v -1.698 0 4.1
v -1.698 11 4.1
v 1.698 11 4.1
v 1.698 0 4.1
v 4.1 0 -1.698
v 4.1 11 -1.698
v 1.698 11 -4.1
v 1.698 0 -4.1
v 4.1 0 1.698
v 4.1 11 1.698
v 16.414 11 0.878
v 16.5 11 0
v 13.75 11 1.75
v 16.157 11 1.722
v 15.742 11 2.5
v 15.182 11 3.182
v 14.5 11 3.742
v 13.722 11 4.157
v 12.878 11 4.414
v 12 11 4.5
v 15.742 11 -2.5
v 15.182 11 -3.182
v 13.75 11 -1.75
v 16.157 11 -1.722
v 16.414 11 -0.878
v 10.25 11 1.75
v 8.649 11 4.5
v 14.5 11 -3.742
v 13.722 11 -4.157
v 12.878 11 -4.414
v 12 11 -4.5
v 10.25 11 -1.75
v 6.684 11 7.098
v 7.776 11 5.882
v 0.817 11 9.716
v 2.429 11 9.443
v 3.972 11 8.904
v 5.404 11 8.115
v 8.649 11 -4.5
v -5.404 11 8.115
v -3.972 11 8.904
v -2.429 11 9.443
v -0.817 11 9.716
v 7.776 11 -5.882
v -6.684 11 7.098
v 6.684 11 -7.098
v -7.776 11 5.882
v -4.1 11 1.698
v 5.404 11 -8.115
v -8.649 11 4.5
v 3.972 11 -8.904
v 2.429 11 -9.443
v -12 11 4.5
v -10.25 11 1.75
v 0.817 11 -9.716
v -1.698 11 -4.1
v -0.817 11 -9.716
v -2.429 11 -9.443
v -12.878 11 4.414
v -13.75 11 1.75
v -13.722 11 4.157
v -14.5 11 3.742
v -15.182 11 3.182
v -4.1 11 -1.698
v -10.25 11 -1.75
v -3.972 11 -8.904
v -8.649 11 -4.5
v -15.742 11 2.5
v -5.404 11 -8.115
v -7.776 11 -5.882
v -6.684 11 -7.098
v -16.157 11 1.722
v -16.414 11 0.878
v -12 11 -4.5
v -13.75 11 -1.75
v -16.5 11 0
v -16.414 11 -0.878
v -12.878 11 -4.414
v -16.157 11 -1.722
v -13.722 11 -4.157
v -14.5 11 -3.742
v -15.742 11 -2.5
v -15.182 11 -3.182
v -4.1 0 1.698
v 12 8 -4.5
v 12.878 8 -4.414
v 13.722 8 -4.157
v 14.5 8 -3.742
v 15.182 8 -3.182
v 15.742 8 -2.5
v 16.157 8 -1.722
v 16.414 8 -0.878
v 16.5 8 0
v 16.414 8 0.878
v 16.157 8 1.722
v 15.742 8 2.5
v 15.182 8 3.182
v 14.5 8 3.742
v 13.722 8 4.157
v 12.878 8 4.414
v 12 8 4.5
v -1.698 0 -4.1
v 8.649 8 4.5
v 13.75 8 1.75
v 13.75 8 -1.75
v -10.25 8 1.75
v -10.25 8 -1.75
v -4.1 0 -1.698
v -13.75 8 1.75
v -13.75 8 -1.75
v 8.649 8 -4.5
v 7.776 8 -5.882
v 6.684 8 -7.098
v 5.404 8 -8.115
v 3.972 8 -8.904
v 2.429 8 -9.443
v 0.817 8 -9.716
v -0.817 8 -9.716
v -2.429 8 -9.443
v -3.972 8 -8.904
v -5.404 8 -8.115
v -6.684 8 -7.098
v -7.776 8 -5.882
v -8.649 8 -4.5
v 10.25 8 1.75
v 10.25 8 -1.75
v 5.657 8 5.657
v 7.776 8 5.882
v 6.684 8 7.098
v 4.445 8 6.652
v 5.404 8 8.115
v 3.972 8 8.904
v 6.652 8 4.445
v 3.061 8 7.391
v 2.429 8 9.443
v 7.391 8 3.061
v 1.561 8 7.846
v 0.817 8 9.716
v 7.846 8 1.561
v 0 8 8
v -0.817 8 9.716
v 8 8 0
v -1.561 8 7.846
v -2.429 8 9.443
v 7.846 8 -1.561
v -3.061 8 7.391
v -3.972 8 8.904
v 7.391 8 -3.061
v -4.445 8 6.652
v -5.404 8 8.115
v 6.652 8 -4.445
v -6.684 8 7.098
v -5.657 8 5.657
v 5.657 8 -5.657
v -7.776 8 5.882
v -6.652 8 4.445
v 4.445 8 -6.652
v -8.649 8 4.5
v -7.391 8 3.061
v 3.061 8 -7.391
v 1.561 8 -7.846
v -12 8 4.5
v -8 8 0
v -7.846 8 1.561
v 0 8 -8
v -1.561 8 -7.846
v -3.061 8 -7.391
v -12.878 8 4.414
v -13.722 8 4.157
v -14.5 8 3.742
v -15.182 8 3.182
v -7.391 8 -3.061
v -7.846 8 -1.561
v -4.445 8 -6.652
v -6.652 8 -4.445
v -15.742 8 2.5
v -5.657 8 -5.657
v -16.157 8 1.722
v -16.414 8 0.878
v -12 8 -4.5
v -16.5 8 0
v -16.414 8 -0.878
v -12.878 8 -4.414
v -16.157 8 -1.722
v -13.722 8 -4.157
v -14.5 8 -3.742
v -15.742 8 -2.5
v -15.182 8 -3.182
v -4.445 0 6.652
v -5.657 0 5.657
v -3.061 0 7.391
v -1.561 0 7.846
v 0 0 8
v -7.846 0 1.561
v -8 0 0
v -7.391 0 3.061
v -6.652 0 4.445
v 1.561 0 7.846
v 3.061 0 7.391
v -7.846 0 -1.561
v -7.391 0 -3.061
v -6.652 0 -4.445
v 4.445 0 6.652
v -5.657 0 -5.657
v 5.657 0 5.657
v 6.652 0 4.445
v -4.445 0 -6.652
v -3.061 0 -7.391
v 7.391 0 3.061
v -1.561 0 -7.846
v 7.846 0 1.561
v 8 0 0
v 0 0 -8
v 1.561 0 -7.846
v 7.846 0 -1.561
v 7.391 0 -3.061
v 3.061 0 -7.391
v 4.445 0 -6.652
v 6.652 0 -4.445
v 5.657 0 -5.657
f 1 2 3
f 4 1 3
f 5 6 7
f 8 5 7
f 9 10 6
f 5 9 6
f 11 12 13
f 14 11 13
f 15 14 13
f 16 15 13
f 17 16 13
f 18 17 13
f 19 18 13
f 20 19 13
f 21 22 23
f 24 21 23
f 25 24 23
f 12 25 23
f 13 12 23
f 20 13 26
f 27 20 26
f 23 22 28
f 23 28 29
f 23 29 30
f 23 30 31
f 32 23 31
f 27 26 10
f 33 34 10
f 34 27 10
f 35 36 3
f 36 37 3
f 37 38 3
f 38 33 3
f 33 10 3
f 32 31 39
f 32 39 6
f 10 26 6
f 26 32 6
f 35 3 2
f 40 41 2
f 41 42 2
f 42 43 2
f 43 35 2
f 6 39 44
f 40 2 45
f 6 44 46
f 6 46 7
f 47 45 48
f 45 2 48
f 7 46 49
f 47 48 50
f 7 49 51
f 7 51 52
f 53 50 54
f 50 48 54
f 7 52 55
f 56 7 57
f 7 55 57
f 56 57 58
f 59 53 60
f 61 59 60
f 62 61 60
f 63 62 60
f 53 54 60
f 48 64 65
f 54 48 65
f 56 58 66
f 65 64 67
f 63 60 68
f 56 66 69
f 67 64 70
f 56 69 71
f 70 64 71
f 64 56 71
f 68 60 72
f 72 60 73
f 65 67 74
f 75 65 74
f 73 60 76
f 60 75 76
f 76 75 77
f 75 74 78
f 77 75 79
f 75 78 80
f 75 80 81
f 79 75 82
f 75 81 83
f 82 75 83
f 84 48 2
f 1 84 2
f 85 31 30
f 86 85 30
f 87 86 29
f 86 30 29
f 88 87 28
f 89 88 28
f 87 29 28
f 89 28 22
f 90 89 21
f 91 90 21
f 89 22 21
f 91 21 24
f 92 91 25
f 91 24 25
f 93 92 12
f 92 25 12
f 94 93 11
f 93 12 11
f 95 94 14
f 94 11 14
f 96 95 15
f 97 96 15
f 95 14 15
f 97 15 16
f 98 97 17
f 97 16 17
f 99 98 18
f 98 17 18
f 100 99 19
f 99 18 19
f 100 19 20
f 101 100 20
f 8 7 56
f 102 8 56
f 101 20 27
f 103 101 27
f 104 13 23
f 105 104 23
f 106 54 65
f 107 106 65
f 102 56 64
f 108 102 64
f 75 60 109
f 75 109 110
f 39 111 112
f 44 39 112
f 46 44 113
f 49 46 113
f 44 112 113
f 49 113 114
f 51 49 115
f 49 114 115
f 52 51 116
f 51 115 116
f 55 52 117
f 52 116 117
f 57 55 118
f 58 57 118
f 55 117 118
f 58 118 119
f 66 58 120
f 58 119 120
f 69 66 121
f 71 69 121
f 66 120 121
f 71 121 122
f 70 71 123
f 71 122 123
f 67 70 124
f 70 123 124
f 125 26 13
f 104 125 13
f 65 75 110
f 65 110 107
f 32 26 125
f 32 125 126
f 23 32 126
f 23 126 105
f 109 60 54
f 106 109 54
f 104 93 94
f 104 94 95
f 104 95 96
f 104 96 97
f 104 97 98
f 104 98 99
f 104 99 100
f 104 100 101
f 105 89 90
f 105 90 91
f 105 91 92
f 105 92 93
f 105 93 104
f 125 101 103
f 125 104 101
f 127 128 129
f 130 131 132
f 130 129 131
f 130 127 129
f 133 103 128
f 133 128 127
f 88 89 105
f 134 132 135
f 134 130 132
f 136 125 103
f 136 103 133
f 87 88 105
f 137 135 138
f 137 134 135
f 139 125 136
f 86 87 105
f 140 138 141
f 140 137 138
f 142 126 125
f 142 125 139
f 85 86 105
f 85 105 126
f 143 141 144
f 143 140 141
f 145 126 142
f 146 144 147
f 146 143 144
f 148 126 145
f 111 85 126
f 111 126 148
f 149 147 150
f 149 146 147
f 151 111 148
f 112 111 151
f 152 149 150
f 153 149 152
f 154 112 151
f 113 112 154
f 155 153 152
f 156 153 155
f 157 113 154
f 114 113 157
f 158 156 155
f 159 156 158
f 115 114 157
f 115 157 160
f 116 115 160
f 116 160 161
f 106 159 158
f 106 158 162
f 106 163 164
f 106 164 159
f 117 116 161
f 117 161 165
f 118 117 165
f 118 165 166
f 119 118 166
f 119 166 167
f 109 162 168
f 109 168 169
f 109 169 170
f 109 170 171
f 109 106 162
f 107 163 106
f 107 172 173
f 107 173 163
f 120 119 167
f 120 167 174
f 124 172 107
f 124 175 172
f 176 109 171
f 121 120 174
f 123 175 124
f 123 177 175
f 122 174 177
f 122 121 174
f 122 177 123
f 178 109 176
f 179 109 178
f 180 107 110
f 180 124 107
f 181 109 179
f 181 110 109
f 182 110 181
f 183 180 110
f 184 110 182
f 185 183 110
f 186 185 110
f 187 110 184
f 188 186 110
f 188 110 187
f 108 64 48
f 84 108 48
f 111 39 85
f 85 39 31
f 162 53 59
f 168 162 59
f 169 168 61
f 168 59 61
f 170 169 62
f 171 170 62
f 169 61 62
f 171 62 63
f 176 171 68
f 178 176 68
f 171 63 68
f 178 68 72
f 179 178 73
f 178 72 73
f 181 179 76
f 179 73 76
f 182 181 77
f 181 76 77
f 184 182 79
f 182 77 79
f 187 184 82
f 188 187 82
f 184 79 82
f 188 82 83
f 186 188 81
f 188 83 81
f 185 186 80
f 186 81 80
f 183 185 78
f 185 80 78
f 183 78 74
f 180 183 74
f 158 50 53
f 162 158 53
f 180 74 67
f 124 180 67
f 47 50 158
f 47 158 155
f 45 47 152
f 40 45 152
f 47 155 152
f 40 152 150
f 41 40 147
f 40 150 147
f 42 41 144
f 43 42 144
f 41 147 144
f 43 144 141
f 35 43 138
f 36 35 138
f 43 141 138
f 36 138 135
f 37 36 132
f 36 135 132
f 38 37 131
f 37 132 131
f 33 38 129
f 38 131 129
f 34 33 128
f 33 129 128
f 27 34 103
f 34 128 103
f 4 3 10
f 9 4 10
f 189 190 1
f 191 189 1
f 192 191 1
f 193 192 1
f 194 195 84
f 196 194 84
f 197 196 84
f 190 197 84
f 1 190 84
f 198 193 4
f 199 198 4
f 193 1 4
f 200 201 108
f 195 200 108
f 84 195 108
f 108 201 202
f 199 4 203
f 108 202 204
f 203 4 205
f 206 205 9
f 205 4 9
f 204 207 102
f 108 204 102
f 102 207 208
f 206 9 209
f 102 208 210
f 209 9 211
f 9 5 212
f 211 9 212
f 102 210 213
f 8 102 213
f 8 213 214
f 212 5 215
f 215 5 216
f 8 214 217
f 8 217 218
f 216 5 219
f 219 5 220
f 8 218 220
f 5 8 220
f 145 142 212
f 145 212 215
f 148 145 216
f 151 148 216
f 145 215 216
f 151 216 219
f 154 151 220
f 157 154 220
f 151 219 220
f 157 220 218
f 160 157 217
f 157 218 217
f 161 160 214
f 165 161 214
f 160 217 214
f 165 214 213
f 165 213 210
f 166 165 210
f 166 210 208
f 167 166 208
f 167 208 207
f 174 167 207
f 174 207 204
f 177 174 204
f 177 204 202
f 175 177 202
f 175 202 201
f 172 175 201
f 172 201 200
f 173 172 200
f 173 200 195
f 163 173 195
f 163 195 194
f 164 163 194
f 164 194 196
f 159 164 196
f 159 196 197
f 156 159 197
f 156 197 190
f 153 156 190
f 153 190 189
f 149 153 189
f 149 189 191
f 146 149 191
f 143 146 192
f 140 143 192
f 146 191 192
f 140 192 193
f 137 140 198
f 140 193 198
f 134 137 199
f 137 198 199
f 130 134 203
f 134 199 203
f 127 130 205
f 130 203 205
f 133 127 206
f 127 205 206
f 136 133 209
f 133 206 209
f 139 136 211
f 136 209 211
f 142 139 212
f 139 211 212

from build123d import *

# Parameters (mm, degrees)
SKETCH1_R           = 8
BOSS_EXTRUDE1_DEPTH = 8
SKETCH2_R           = 9.75
BOSS_EXTRUDE2_DEPTH = 3
BOSS_EXTRUDE3_DEPTH = 3
CUT_EXTRUDE2_REACH  = 13
SKETCH5_W           = 3.5
SKETCH5_H           = 3.5
CUT_EXTRUDE1_DEPTH  = 12


with BuildPart() as part:
    # Sketch1 → Boss-Extrude1 (new body)
    with BuildSketch(Plane(origin=(0, 0, 0), x_dir=(1, 0, 0), z_dir=(0, 1, 0))):
        Circle(SKETCH1_R)
    extrude(amount=BOSS_EXTRUDE1_DEPTH)

    # Sketch2 → Boss-Extrude2 (add)
    with BuildSketch(Plane(origin=(0, 8, 0), x_dir=(1, 0, 0), z_dir=(0, 1, 0))):
        Circle(SKETCH2_R)
    extrude(amount=BOSS_EXTRUDE2_DEPTH)

    # Sketch4 → Boss-Extrude3 (add)
    with BuildSketch(Plane(origin=(0, 11, 0), x_dir=(1, 0, 0), z_dir=(0, 1, 0))):
        with BuildLine():
            Line((12, -4.5), (-12, -4.5))
            ThreePointArc((-12, -4.5), (-16.5, 0), (-12, 4.5))
            Line((-12, 4.5), (12, 4.5))
            ThreePointArc((12, 4.5), (16.5, 0), (12, -4.5))
        make_face()
    extrude(amount=-BOSS_EXTRUDE3_DEPTH)

    # Sketch5 → Cut-Extrude2 (cut, up to next)
    with BuildSketch(Plane(origin=(0, 11, 0), x_dir=(1, 0, 0), z_dir=(0, 1, 0)), mode=Mode.PRIVATE) as cut_extrude2_sk1:
        with Locations((-12, 0)):
            Rectangle(SKETCH5_W, SKETCH5_H)
    cut_extrude2_tool1 = extrude(cut_extrude2_sk1.sketch, amount=-CUT_EXTRUDE2_REACH, mode=Mode.PRIVATE) & part.part
    add(cut_extrude2_tool1.solids().sort_by_distance((-12, 11, 0))[0], mode=Mode.SUBTRACT)
    # Sketch5 → Cut-Extrude2 (cut, up to next)
    with BuildSketch(Plane(origin=(0, 11, 0), x_dir=(1, 0, 0), z_dir=(0, 1, 0)), mode=Mode.PRIVATE) as cut_extrude2_sk2:
        with Locations((12, 0)):
            Rectangle(SKETCH5_W, SKETCH5_H)
    cut_extrude2_tool2 = extrude(cut_extrude2_sk2.sketch, amount=-CUT_EXTRUDE2_REACH, mode=Mode.PRIVATE) & part.part
    add(cut_extrude2_tool2.solids().sort_by_distance((12, 11, 0))[0], mode=Mode.SUBTRACT)

    # Sketch3 → Cut-Extrude1 (cut, through all)
    with BuildSketch(Plane(origin=(0, 11, 0), x_dir=(1, 0, 0), z_dir=(0, 1, 0))):
        Polygon((4.1, 1.698275606), (1.698275606, 4.1), (-1.698275606, 4.1), (-4.1, 1.698275606), (-4.1, -1.698275606), (-1.698275606, -4.1), (1.698275606, -4.1), (4.1, -1.698275606), align=None)
    extrude(amount=-CUT_EXTRUDE1_DEPTH, mode=Mode.SUBTRACT)


solid = part.part
